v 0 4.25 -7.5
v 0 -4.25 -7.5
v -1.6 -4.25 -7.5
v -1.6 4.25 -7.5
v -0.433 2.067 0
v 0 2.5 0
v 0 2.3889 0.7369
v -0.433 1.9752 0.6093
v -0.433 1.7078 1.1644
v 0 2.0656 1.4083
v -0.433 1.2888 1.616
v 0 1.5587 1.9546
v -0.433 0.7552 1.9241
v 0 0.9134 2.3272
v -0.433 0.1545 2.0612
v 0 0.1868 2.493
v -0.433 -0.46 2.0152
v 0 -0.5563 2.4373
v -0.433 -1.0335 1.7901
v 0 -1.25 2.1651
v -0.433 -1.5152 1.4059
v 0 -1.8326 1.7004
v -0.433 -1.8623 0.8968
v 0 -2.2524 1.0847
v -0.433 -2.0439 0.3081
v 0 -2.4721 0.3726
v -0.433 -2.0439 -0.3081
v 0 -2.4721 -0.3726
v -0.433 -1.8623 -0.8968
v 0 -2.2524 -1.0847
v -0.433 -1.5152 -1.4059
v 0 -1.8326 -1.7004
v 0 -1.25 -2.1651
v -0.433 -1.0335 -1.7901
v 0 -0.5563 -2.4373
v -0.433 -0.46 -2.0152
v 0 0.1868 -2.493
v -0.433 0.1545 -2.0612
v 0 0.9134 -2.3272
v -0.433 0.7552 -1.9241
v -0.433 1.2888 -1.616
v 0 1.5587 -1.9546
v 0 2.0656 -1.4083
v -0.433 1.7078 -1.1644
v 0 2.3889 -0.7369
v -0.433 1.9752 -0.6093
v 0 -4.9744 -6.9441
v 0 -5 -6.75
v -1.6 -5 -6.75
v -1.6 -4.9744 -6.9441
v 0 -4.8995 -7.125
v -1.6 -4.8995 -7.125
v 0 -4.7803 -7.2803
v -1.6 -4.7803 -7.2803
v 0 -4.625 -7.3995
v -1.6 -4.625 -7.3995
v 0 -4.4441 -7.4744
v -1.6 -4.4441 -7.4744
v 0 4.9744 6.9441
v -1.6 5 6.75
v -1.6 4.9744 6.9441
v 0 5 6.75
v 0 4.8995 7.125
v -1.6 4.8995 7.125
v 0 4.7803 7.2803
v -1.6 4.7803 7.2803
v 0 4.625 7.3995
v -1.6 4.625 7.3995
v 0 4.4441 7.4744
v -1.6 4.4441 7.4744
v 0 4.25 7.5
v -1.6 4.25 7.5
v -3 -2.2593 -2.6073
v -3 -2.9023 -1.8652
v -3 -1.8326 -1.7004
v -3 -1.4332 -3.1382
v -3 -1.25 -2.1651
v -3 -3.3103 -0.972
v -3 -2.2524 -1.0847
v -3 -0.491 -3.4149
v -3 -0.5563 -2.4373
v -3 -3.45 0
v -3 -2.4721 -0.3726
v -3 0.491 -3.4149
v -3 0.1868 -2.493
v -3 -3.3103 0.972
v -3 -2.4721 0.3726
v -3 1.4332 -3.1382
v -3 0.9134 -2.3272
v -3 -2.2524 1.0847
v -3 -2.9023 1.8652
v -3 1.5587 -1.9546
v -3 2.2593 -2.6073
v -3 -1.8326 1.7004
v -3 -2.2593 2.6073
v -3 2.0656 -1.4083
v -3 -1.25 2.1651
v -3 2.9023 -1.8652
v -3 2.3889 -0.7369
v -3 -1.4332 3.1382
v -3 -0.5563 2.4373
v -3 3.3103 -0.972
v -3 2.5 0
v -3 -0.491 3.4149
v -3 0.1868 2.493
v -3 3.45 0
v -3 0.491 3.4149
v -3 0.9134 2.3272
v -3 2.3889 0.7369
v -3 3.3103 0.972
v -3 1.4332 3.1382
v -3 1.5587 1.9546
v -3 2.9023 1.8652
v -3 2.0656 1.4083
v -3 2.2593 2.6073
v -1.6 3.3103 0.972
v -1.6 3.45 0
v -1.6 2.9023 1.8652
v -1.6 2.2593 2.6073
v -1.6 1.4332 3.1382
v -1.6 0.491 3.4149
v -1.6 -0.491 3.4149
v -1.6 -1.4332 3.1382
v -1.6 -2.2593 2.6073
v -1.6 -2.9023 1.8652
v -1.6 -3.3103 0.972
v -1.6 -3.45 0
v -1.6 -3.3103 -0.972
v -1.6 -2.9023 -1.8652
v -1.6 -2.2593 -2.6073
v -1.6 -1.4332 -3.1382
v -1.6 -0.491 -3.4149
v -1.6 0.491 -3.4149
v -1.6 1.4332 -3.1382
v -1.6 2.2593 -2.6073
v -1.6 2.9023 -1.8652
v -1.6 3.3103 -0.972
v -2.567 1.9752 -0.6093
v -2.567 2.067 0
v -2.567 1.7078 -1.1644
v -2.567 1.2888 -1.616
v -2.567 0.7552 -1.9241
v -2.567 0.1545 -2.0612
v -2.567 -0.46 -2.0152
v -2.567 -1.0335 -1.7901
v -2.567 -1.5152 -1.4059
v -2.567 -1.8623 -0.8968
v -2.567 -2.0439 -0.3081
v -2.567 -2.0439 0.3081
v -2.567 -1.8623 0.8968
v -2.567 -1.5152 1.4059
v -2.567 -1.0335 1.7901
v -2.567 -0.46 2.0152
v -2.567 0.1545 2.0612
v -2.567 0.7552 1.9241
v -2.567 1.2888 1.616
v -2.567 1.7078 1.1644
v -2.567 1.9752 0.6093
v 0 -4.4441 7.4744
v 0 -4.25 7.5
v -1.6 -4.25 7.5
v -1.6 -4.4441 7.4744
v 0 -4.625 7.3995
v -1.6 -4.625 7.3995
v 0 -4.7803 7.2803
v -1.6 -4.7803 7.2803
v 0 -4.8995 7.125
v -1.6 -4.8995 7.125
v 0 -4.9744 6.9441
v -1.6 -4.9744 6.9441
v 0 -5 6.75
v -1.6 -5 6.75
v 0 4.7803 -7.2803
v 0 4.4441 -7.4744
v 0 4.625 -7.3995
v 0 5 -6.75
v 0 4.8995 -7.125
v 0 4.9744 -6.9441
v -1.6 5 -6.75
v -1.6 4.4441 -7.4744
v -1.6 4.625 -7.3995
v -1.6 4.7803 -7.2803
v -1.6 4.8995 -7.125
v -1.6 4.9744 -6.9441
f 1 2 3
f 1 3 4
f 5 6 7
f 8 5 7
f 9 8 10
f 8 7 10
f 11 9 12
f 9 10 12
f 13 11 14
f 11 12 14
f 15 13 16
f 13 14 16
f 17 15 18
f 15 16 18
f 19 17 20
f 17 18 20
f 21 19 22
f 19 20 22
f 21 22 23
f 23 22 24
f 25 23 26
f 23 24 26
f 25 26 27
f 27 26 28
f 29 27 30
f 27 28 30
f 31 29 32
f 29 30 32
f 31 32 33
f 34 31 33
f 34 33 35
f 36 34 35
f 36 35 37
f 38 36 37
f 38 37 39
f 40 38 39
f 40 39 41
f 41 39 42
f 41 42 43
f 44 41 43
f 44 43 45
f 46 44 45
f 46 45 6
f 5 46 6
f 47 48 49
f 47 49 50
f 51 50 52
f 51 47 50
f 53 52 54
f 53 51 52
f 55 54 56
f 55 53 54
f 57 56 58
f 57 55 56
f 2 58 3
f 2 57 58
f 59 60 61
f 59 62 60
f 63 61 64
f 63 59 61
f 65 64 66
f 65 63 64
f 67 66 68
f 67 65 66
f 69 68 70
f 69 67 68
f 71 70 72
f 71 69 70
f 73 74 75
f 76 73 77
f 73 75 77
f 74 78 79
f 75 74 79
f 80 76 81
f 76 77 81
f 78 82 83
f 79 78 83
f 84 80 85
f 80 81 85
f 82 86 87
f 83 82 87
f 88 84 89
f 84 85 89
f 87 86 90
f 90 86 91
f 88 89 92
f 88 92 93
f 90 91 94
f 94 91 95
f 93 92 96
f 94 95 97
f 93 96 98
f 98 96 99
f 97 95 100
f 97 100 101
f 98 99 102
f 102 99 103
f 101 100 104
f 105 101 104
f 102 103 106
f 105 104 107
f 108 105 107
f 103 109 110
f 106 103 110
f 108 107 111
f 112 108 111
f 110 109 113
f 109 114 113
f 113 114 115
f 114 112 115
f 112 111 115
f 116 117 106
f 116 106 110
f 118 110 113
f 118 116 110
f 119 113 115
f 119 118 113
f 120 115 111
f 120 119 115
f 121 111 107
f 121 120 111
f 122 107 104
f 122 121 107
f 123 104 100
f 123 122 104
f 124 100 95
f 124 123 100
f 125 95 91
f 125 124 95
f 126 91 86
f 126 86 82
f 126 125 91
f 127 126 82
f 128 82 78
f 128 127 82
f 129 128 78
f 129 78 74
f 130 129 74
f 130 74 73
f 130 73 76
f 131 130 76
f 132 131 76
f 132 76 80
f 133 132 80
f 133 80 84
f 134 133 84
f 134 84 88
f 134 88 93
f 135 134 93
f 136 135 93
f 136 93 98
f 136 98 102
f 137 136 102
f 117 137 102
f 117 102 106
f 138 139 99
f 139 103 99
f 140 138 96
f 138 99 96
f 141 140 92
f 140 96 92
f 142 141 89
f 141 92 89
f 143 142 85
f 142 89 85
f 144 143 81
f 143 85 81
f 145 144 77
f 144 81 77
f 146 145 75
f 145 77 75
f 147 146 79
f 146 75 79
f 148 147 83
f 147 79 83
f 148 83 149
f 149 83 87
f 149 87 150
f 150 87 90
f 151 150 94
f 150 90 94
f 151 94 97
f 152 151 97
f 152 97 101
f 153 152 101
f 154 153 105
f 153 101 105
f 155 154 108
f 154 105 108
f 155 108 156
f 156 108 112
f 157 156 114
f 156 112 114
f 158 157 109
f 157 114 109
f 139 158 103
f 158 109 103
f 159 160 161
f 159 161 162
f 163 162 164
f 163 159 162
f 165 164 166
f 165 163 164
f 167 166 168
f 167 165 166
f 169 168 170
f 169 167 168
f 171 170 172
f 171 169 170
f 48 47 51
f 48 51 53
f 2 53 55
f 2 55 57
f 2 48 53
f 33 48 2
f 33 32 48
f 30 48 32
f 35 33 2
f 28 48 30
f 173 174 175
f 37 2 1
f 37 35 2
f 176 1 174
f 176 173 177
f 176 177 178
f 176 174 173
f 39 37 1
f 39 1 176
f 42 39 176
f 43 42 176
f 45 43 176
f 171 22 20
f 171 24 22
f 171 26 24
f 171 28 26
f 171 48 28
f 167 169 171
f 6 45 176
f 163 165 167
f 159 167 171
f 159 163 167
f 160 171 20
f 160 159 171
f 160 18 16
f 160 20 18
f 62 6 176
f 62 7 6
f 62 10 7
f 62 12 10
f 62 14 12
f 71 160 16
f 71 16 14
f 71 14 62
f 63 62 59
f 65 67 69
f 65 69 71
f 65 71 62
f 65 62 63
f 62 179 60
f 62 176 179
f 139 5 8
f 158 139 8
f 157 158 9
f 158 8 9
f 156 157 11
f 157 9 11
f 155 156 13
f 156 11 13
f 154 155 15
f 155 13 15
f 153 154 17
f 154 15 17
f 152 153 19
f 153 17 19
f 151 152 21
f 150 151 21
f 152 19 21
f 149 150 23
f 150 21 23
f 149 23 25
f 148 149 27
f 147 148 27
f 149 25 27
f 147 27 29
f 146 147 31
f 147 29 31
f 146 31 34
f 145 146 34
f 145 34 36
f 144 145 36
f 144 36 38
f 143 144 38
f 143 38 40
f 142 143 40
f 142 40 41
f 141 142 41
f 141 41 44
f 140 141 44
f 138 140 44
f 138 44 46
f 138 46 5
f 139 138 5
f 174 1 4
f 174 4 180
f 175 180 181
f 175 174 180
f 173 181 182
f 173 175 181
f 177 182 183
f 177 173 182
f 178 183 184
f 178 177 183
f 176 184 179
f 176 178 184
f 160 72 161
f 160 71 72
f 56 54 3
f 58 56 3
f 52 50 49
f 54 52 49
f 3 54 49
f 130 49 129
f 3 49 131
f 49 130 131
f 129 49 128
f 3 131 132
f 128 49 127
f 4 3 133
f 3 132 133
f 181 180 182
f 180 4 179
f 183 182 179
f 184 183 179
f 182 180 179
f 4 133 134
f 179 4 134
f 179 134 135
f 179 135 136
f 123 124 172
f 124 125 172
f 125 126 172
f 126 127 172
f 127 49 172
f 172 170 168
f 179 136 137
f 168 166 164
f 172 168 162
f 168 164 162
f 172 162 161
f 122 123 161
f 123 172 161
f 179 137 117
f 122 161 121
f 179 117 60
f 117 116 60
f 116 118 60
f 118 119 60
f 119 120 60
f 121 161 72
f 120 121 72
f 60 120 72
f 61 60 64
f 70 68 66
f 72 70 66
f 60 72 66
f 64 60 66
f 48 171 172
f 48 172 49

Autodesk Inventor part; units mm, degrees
sketch "Sketch_1" plane through (0, 0, 0) normal (1, 0, 0) x (0, 1, 0)
  line L0 (4.25, 7.5) -> (-4.25, 7.5)
  arc A0 (-4.25, 7.5) -> (-5, 6.75) centre (-4.25, 6.75) ccw
  line L1 (-5, 6.75) -> (-5, -6.75)
  arc A1 (-5, -6.75) -> (-4.25, -7.5) centre (-4.25, -6.75) ccw
  line L2 (-4.25, -7.5) -> (4.25, -7.5)
  arc A2 (4.25, -7.5) -> (5, -6.75) centre (4.25, -6.75) ccw
  line L3 (5, -6.75) -> (5, 6.75)
  arc A3 (5, 6.75) -> (4.25, 7.5) centre (4.25, 6.75) ccw
extrude "Extrusion1" add sketch "Sketch_1" against normal blind 3
sketch "Sketch_2" plane through (0, 0, 0) normal (0, 0, 1) x (1, 0, 0)
  line L0 (3, 0) -> (-3, 0)
  line L1 (-4.6, 3.45) -> (-1.6, 3.45)
  line L2 (-1.6, 3.45) -> (-1.6, 13.45)
  line L3 (-1.6, 13.45) -> (-4.6, 13.45)
  line L4 (-4.6, 13.45) -> (-4.6, 3.45)
revolve "Revolution1" cut sketch "Sketch_2" angle 360 about axis through (3, 0, 0) along (1, 0, 0)
sketch "Sketch_3" plane through (0, 0, 0) normal (0, 0, 1) x (1, 0, 0)
  line L0 (0, 0) -> (-3, 0)
  line L1 (-3, 0) -> (-3, 2.5)
  line L2 (-3, 2.5) -> (-2.567, 2.067)
  line L3 (-2.567, 2.067) -> (-0.433, 2.067)
  line L4 (-0.433, 2.067) -> (0, 2.5)
  line L5 (0, 2.5) -> (0, 0)
  line L6 (0, 0) -> (-3, 0)
revolve "Revolution2" cut sketch "Sketch_3" angle 360 about axis through (0, 0, 0) along (1, 0, 0)
thread "Thread1" size "M5x0.8" class "6H" standard "ISO Metric profile" full length
ref_plane "dummy_XY" through (0, 0, 0) normal (1, 0, 0) x (0, 0, -1)
ref_plane "dummy_YZ" through (0, 0, 0) normal (0, 0, -1) x (0, 1, 0)
ref_plane "dummy_ZX" through (0, 0, 0) normal (0, 1, 0) x (1, 0, 0)
properties part number "HNKK5-5"
